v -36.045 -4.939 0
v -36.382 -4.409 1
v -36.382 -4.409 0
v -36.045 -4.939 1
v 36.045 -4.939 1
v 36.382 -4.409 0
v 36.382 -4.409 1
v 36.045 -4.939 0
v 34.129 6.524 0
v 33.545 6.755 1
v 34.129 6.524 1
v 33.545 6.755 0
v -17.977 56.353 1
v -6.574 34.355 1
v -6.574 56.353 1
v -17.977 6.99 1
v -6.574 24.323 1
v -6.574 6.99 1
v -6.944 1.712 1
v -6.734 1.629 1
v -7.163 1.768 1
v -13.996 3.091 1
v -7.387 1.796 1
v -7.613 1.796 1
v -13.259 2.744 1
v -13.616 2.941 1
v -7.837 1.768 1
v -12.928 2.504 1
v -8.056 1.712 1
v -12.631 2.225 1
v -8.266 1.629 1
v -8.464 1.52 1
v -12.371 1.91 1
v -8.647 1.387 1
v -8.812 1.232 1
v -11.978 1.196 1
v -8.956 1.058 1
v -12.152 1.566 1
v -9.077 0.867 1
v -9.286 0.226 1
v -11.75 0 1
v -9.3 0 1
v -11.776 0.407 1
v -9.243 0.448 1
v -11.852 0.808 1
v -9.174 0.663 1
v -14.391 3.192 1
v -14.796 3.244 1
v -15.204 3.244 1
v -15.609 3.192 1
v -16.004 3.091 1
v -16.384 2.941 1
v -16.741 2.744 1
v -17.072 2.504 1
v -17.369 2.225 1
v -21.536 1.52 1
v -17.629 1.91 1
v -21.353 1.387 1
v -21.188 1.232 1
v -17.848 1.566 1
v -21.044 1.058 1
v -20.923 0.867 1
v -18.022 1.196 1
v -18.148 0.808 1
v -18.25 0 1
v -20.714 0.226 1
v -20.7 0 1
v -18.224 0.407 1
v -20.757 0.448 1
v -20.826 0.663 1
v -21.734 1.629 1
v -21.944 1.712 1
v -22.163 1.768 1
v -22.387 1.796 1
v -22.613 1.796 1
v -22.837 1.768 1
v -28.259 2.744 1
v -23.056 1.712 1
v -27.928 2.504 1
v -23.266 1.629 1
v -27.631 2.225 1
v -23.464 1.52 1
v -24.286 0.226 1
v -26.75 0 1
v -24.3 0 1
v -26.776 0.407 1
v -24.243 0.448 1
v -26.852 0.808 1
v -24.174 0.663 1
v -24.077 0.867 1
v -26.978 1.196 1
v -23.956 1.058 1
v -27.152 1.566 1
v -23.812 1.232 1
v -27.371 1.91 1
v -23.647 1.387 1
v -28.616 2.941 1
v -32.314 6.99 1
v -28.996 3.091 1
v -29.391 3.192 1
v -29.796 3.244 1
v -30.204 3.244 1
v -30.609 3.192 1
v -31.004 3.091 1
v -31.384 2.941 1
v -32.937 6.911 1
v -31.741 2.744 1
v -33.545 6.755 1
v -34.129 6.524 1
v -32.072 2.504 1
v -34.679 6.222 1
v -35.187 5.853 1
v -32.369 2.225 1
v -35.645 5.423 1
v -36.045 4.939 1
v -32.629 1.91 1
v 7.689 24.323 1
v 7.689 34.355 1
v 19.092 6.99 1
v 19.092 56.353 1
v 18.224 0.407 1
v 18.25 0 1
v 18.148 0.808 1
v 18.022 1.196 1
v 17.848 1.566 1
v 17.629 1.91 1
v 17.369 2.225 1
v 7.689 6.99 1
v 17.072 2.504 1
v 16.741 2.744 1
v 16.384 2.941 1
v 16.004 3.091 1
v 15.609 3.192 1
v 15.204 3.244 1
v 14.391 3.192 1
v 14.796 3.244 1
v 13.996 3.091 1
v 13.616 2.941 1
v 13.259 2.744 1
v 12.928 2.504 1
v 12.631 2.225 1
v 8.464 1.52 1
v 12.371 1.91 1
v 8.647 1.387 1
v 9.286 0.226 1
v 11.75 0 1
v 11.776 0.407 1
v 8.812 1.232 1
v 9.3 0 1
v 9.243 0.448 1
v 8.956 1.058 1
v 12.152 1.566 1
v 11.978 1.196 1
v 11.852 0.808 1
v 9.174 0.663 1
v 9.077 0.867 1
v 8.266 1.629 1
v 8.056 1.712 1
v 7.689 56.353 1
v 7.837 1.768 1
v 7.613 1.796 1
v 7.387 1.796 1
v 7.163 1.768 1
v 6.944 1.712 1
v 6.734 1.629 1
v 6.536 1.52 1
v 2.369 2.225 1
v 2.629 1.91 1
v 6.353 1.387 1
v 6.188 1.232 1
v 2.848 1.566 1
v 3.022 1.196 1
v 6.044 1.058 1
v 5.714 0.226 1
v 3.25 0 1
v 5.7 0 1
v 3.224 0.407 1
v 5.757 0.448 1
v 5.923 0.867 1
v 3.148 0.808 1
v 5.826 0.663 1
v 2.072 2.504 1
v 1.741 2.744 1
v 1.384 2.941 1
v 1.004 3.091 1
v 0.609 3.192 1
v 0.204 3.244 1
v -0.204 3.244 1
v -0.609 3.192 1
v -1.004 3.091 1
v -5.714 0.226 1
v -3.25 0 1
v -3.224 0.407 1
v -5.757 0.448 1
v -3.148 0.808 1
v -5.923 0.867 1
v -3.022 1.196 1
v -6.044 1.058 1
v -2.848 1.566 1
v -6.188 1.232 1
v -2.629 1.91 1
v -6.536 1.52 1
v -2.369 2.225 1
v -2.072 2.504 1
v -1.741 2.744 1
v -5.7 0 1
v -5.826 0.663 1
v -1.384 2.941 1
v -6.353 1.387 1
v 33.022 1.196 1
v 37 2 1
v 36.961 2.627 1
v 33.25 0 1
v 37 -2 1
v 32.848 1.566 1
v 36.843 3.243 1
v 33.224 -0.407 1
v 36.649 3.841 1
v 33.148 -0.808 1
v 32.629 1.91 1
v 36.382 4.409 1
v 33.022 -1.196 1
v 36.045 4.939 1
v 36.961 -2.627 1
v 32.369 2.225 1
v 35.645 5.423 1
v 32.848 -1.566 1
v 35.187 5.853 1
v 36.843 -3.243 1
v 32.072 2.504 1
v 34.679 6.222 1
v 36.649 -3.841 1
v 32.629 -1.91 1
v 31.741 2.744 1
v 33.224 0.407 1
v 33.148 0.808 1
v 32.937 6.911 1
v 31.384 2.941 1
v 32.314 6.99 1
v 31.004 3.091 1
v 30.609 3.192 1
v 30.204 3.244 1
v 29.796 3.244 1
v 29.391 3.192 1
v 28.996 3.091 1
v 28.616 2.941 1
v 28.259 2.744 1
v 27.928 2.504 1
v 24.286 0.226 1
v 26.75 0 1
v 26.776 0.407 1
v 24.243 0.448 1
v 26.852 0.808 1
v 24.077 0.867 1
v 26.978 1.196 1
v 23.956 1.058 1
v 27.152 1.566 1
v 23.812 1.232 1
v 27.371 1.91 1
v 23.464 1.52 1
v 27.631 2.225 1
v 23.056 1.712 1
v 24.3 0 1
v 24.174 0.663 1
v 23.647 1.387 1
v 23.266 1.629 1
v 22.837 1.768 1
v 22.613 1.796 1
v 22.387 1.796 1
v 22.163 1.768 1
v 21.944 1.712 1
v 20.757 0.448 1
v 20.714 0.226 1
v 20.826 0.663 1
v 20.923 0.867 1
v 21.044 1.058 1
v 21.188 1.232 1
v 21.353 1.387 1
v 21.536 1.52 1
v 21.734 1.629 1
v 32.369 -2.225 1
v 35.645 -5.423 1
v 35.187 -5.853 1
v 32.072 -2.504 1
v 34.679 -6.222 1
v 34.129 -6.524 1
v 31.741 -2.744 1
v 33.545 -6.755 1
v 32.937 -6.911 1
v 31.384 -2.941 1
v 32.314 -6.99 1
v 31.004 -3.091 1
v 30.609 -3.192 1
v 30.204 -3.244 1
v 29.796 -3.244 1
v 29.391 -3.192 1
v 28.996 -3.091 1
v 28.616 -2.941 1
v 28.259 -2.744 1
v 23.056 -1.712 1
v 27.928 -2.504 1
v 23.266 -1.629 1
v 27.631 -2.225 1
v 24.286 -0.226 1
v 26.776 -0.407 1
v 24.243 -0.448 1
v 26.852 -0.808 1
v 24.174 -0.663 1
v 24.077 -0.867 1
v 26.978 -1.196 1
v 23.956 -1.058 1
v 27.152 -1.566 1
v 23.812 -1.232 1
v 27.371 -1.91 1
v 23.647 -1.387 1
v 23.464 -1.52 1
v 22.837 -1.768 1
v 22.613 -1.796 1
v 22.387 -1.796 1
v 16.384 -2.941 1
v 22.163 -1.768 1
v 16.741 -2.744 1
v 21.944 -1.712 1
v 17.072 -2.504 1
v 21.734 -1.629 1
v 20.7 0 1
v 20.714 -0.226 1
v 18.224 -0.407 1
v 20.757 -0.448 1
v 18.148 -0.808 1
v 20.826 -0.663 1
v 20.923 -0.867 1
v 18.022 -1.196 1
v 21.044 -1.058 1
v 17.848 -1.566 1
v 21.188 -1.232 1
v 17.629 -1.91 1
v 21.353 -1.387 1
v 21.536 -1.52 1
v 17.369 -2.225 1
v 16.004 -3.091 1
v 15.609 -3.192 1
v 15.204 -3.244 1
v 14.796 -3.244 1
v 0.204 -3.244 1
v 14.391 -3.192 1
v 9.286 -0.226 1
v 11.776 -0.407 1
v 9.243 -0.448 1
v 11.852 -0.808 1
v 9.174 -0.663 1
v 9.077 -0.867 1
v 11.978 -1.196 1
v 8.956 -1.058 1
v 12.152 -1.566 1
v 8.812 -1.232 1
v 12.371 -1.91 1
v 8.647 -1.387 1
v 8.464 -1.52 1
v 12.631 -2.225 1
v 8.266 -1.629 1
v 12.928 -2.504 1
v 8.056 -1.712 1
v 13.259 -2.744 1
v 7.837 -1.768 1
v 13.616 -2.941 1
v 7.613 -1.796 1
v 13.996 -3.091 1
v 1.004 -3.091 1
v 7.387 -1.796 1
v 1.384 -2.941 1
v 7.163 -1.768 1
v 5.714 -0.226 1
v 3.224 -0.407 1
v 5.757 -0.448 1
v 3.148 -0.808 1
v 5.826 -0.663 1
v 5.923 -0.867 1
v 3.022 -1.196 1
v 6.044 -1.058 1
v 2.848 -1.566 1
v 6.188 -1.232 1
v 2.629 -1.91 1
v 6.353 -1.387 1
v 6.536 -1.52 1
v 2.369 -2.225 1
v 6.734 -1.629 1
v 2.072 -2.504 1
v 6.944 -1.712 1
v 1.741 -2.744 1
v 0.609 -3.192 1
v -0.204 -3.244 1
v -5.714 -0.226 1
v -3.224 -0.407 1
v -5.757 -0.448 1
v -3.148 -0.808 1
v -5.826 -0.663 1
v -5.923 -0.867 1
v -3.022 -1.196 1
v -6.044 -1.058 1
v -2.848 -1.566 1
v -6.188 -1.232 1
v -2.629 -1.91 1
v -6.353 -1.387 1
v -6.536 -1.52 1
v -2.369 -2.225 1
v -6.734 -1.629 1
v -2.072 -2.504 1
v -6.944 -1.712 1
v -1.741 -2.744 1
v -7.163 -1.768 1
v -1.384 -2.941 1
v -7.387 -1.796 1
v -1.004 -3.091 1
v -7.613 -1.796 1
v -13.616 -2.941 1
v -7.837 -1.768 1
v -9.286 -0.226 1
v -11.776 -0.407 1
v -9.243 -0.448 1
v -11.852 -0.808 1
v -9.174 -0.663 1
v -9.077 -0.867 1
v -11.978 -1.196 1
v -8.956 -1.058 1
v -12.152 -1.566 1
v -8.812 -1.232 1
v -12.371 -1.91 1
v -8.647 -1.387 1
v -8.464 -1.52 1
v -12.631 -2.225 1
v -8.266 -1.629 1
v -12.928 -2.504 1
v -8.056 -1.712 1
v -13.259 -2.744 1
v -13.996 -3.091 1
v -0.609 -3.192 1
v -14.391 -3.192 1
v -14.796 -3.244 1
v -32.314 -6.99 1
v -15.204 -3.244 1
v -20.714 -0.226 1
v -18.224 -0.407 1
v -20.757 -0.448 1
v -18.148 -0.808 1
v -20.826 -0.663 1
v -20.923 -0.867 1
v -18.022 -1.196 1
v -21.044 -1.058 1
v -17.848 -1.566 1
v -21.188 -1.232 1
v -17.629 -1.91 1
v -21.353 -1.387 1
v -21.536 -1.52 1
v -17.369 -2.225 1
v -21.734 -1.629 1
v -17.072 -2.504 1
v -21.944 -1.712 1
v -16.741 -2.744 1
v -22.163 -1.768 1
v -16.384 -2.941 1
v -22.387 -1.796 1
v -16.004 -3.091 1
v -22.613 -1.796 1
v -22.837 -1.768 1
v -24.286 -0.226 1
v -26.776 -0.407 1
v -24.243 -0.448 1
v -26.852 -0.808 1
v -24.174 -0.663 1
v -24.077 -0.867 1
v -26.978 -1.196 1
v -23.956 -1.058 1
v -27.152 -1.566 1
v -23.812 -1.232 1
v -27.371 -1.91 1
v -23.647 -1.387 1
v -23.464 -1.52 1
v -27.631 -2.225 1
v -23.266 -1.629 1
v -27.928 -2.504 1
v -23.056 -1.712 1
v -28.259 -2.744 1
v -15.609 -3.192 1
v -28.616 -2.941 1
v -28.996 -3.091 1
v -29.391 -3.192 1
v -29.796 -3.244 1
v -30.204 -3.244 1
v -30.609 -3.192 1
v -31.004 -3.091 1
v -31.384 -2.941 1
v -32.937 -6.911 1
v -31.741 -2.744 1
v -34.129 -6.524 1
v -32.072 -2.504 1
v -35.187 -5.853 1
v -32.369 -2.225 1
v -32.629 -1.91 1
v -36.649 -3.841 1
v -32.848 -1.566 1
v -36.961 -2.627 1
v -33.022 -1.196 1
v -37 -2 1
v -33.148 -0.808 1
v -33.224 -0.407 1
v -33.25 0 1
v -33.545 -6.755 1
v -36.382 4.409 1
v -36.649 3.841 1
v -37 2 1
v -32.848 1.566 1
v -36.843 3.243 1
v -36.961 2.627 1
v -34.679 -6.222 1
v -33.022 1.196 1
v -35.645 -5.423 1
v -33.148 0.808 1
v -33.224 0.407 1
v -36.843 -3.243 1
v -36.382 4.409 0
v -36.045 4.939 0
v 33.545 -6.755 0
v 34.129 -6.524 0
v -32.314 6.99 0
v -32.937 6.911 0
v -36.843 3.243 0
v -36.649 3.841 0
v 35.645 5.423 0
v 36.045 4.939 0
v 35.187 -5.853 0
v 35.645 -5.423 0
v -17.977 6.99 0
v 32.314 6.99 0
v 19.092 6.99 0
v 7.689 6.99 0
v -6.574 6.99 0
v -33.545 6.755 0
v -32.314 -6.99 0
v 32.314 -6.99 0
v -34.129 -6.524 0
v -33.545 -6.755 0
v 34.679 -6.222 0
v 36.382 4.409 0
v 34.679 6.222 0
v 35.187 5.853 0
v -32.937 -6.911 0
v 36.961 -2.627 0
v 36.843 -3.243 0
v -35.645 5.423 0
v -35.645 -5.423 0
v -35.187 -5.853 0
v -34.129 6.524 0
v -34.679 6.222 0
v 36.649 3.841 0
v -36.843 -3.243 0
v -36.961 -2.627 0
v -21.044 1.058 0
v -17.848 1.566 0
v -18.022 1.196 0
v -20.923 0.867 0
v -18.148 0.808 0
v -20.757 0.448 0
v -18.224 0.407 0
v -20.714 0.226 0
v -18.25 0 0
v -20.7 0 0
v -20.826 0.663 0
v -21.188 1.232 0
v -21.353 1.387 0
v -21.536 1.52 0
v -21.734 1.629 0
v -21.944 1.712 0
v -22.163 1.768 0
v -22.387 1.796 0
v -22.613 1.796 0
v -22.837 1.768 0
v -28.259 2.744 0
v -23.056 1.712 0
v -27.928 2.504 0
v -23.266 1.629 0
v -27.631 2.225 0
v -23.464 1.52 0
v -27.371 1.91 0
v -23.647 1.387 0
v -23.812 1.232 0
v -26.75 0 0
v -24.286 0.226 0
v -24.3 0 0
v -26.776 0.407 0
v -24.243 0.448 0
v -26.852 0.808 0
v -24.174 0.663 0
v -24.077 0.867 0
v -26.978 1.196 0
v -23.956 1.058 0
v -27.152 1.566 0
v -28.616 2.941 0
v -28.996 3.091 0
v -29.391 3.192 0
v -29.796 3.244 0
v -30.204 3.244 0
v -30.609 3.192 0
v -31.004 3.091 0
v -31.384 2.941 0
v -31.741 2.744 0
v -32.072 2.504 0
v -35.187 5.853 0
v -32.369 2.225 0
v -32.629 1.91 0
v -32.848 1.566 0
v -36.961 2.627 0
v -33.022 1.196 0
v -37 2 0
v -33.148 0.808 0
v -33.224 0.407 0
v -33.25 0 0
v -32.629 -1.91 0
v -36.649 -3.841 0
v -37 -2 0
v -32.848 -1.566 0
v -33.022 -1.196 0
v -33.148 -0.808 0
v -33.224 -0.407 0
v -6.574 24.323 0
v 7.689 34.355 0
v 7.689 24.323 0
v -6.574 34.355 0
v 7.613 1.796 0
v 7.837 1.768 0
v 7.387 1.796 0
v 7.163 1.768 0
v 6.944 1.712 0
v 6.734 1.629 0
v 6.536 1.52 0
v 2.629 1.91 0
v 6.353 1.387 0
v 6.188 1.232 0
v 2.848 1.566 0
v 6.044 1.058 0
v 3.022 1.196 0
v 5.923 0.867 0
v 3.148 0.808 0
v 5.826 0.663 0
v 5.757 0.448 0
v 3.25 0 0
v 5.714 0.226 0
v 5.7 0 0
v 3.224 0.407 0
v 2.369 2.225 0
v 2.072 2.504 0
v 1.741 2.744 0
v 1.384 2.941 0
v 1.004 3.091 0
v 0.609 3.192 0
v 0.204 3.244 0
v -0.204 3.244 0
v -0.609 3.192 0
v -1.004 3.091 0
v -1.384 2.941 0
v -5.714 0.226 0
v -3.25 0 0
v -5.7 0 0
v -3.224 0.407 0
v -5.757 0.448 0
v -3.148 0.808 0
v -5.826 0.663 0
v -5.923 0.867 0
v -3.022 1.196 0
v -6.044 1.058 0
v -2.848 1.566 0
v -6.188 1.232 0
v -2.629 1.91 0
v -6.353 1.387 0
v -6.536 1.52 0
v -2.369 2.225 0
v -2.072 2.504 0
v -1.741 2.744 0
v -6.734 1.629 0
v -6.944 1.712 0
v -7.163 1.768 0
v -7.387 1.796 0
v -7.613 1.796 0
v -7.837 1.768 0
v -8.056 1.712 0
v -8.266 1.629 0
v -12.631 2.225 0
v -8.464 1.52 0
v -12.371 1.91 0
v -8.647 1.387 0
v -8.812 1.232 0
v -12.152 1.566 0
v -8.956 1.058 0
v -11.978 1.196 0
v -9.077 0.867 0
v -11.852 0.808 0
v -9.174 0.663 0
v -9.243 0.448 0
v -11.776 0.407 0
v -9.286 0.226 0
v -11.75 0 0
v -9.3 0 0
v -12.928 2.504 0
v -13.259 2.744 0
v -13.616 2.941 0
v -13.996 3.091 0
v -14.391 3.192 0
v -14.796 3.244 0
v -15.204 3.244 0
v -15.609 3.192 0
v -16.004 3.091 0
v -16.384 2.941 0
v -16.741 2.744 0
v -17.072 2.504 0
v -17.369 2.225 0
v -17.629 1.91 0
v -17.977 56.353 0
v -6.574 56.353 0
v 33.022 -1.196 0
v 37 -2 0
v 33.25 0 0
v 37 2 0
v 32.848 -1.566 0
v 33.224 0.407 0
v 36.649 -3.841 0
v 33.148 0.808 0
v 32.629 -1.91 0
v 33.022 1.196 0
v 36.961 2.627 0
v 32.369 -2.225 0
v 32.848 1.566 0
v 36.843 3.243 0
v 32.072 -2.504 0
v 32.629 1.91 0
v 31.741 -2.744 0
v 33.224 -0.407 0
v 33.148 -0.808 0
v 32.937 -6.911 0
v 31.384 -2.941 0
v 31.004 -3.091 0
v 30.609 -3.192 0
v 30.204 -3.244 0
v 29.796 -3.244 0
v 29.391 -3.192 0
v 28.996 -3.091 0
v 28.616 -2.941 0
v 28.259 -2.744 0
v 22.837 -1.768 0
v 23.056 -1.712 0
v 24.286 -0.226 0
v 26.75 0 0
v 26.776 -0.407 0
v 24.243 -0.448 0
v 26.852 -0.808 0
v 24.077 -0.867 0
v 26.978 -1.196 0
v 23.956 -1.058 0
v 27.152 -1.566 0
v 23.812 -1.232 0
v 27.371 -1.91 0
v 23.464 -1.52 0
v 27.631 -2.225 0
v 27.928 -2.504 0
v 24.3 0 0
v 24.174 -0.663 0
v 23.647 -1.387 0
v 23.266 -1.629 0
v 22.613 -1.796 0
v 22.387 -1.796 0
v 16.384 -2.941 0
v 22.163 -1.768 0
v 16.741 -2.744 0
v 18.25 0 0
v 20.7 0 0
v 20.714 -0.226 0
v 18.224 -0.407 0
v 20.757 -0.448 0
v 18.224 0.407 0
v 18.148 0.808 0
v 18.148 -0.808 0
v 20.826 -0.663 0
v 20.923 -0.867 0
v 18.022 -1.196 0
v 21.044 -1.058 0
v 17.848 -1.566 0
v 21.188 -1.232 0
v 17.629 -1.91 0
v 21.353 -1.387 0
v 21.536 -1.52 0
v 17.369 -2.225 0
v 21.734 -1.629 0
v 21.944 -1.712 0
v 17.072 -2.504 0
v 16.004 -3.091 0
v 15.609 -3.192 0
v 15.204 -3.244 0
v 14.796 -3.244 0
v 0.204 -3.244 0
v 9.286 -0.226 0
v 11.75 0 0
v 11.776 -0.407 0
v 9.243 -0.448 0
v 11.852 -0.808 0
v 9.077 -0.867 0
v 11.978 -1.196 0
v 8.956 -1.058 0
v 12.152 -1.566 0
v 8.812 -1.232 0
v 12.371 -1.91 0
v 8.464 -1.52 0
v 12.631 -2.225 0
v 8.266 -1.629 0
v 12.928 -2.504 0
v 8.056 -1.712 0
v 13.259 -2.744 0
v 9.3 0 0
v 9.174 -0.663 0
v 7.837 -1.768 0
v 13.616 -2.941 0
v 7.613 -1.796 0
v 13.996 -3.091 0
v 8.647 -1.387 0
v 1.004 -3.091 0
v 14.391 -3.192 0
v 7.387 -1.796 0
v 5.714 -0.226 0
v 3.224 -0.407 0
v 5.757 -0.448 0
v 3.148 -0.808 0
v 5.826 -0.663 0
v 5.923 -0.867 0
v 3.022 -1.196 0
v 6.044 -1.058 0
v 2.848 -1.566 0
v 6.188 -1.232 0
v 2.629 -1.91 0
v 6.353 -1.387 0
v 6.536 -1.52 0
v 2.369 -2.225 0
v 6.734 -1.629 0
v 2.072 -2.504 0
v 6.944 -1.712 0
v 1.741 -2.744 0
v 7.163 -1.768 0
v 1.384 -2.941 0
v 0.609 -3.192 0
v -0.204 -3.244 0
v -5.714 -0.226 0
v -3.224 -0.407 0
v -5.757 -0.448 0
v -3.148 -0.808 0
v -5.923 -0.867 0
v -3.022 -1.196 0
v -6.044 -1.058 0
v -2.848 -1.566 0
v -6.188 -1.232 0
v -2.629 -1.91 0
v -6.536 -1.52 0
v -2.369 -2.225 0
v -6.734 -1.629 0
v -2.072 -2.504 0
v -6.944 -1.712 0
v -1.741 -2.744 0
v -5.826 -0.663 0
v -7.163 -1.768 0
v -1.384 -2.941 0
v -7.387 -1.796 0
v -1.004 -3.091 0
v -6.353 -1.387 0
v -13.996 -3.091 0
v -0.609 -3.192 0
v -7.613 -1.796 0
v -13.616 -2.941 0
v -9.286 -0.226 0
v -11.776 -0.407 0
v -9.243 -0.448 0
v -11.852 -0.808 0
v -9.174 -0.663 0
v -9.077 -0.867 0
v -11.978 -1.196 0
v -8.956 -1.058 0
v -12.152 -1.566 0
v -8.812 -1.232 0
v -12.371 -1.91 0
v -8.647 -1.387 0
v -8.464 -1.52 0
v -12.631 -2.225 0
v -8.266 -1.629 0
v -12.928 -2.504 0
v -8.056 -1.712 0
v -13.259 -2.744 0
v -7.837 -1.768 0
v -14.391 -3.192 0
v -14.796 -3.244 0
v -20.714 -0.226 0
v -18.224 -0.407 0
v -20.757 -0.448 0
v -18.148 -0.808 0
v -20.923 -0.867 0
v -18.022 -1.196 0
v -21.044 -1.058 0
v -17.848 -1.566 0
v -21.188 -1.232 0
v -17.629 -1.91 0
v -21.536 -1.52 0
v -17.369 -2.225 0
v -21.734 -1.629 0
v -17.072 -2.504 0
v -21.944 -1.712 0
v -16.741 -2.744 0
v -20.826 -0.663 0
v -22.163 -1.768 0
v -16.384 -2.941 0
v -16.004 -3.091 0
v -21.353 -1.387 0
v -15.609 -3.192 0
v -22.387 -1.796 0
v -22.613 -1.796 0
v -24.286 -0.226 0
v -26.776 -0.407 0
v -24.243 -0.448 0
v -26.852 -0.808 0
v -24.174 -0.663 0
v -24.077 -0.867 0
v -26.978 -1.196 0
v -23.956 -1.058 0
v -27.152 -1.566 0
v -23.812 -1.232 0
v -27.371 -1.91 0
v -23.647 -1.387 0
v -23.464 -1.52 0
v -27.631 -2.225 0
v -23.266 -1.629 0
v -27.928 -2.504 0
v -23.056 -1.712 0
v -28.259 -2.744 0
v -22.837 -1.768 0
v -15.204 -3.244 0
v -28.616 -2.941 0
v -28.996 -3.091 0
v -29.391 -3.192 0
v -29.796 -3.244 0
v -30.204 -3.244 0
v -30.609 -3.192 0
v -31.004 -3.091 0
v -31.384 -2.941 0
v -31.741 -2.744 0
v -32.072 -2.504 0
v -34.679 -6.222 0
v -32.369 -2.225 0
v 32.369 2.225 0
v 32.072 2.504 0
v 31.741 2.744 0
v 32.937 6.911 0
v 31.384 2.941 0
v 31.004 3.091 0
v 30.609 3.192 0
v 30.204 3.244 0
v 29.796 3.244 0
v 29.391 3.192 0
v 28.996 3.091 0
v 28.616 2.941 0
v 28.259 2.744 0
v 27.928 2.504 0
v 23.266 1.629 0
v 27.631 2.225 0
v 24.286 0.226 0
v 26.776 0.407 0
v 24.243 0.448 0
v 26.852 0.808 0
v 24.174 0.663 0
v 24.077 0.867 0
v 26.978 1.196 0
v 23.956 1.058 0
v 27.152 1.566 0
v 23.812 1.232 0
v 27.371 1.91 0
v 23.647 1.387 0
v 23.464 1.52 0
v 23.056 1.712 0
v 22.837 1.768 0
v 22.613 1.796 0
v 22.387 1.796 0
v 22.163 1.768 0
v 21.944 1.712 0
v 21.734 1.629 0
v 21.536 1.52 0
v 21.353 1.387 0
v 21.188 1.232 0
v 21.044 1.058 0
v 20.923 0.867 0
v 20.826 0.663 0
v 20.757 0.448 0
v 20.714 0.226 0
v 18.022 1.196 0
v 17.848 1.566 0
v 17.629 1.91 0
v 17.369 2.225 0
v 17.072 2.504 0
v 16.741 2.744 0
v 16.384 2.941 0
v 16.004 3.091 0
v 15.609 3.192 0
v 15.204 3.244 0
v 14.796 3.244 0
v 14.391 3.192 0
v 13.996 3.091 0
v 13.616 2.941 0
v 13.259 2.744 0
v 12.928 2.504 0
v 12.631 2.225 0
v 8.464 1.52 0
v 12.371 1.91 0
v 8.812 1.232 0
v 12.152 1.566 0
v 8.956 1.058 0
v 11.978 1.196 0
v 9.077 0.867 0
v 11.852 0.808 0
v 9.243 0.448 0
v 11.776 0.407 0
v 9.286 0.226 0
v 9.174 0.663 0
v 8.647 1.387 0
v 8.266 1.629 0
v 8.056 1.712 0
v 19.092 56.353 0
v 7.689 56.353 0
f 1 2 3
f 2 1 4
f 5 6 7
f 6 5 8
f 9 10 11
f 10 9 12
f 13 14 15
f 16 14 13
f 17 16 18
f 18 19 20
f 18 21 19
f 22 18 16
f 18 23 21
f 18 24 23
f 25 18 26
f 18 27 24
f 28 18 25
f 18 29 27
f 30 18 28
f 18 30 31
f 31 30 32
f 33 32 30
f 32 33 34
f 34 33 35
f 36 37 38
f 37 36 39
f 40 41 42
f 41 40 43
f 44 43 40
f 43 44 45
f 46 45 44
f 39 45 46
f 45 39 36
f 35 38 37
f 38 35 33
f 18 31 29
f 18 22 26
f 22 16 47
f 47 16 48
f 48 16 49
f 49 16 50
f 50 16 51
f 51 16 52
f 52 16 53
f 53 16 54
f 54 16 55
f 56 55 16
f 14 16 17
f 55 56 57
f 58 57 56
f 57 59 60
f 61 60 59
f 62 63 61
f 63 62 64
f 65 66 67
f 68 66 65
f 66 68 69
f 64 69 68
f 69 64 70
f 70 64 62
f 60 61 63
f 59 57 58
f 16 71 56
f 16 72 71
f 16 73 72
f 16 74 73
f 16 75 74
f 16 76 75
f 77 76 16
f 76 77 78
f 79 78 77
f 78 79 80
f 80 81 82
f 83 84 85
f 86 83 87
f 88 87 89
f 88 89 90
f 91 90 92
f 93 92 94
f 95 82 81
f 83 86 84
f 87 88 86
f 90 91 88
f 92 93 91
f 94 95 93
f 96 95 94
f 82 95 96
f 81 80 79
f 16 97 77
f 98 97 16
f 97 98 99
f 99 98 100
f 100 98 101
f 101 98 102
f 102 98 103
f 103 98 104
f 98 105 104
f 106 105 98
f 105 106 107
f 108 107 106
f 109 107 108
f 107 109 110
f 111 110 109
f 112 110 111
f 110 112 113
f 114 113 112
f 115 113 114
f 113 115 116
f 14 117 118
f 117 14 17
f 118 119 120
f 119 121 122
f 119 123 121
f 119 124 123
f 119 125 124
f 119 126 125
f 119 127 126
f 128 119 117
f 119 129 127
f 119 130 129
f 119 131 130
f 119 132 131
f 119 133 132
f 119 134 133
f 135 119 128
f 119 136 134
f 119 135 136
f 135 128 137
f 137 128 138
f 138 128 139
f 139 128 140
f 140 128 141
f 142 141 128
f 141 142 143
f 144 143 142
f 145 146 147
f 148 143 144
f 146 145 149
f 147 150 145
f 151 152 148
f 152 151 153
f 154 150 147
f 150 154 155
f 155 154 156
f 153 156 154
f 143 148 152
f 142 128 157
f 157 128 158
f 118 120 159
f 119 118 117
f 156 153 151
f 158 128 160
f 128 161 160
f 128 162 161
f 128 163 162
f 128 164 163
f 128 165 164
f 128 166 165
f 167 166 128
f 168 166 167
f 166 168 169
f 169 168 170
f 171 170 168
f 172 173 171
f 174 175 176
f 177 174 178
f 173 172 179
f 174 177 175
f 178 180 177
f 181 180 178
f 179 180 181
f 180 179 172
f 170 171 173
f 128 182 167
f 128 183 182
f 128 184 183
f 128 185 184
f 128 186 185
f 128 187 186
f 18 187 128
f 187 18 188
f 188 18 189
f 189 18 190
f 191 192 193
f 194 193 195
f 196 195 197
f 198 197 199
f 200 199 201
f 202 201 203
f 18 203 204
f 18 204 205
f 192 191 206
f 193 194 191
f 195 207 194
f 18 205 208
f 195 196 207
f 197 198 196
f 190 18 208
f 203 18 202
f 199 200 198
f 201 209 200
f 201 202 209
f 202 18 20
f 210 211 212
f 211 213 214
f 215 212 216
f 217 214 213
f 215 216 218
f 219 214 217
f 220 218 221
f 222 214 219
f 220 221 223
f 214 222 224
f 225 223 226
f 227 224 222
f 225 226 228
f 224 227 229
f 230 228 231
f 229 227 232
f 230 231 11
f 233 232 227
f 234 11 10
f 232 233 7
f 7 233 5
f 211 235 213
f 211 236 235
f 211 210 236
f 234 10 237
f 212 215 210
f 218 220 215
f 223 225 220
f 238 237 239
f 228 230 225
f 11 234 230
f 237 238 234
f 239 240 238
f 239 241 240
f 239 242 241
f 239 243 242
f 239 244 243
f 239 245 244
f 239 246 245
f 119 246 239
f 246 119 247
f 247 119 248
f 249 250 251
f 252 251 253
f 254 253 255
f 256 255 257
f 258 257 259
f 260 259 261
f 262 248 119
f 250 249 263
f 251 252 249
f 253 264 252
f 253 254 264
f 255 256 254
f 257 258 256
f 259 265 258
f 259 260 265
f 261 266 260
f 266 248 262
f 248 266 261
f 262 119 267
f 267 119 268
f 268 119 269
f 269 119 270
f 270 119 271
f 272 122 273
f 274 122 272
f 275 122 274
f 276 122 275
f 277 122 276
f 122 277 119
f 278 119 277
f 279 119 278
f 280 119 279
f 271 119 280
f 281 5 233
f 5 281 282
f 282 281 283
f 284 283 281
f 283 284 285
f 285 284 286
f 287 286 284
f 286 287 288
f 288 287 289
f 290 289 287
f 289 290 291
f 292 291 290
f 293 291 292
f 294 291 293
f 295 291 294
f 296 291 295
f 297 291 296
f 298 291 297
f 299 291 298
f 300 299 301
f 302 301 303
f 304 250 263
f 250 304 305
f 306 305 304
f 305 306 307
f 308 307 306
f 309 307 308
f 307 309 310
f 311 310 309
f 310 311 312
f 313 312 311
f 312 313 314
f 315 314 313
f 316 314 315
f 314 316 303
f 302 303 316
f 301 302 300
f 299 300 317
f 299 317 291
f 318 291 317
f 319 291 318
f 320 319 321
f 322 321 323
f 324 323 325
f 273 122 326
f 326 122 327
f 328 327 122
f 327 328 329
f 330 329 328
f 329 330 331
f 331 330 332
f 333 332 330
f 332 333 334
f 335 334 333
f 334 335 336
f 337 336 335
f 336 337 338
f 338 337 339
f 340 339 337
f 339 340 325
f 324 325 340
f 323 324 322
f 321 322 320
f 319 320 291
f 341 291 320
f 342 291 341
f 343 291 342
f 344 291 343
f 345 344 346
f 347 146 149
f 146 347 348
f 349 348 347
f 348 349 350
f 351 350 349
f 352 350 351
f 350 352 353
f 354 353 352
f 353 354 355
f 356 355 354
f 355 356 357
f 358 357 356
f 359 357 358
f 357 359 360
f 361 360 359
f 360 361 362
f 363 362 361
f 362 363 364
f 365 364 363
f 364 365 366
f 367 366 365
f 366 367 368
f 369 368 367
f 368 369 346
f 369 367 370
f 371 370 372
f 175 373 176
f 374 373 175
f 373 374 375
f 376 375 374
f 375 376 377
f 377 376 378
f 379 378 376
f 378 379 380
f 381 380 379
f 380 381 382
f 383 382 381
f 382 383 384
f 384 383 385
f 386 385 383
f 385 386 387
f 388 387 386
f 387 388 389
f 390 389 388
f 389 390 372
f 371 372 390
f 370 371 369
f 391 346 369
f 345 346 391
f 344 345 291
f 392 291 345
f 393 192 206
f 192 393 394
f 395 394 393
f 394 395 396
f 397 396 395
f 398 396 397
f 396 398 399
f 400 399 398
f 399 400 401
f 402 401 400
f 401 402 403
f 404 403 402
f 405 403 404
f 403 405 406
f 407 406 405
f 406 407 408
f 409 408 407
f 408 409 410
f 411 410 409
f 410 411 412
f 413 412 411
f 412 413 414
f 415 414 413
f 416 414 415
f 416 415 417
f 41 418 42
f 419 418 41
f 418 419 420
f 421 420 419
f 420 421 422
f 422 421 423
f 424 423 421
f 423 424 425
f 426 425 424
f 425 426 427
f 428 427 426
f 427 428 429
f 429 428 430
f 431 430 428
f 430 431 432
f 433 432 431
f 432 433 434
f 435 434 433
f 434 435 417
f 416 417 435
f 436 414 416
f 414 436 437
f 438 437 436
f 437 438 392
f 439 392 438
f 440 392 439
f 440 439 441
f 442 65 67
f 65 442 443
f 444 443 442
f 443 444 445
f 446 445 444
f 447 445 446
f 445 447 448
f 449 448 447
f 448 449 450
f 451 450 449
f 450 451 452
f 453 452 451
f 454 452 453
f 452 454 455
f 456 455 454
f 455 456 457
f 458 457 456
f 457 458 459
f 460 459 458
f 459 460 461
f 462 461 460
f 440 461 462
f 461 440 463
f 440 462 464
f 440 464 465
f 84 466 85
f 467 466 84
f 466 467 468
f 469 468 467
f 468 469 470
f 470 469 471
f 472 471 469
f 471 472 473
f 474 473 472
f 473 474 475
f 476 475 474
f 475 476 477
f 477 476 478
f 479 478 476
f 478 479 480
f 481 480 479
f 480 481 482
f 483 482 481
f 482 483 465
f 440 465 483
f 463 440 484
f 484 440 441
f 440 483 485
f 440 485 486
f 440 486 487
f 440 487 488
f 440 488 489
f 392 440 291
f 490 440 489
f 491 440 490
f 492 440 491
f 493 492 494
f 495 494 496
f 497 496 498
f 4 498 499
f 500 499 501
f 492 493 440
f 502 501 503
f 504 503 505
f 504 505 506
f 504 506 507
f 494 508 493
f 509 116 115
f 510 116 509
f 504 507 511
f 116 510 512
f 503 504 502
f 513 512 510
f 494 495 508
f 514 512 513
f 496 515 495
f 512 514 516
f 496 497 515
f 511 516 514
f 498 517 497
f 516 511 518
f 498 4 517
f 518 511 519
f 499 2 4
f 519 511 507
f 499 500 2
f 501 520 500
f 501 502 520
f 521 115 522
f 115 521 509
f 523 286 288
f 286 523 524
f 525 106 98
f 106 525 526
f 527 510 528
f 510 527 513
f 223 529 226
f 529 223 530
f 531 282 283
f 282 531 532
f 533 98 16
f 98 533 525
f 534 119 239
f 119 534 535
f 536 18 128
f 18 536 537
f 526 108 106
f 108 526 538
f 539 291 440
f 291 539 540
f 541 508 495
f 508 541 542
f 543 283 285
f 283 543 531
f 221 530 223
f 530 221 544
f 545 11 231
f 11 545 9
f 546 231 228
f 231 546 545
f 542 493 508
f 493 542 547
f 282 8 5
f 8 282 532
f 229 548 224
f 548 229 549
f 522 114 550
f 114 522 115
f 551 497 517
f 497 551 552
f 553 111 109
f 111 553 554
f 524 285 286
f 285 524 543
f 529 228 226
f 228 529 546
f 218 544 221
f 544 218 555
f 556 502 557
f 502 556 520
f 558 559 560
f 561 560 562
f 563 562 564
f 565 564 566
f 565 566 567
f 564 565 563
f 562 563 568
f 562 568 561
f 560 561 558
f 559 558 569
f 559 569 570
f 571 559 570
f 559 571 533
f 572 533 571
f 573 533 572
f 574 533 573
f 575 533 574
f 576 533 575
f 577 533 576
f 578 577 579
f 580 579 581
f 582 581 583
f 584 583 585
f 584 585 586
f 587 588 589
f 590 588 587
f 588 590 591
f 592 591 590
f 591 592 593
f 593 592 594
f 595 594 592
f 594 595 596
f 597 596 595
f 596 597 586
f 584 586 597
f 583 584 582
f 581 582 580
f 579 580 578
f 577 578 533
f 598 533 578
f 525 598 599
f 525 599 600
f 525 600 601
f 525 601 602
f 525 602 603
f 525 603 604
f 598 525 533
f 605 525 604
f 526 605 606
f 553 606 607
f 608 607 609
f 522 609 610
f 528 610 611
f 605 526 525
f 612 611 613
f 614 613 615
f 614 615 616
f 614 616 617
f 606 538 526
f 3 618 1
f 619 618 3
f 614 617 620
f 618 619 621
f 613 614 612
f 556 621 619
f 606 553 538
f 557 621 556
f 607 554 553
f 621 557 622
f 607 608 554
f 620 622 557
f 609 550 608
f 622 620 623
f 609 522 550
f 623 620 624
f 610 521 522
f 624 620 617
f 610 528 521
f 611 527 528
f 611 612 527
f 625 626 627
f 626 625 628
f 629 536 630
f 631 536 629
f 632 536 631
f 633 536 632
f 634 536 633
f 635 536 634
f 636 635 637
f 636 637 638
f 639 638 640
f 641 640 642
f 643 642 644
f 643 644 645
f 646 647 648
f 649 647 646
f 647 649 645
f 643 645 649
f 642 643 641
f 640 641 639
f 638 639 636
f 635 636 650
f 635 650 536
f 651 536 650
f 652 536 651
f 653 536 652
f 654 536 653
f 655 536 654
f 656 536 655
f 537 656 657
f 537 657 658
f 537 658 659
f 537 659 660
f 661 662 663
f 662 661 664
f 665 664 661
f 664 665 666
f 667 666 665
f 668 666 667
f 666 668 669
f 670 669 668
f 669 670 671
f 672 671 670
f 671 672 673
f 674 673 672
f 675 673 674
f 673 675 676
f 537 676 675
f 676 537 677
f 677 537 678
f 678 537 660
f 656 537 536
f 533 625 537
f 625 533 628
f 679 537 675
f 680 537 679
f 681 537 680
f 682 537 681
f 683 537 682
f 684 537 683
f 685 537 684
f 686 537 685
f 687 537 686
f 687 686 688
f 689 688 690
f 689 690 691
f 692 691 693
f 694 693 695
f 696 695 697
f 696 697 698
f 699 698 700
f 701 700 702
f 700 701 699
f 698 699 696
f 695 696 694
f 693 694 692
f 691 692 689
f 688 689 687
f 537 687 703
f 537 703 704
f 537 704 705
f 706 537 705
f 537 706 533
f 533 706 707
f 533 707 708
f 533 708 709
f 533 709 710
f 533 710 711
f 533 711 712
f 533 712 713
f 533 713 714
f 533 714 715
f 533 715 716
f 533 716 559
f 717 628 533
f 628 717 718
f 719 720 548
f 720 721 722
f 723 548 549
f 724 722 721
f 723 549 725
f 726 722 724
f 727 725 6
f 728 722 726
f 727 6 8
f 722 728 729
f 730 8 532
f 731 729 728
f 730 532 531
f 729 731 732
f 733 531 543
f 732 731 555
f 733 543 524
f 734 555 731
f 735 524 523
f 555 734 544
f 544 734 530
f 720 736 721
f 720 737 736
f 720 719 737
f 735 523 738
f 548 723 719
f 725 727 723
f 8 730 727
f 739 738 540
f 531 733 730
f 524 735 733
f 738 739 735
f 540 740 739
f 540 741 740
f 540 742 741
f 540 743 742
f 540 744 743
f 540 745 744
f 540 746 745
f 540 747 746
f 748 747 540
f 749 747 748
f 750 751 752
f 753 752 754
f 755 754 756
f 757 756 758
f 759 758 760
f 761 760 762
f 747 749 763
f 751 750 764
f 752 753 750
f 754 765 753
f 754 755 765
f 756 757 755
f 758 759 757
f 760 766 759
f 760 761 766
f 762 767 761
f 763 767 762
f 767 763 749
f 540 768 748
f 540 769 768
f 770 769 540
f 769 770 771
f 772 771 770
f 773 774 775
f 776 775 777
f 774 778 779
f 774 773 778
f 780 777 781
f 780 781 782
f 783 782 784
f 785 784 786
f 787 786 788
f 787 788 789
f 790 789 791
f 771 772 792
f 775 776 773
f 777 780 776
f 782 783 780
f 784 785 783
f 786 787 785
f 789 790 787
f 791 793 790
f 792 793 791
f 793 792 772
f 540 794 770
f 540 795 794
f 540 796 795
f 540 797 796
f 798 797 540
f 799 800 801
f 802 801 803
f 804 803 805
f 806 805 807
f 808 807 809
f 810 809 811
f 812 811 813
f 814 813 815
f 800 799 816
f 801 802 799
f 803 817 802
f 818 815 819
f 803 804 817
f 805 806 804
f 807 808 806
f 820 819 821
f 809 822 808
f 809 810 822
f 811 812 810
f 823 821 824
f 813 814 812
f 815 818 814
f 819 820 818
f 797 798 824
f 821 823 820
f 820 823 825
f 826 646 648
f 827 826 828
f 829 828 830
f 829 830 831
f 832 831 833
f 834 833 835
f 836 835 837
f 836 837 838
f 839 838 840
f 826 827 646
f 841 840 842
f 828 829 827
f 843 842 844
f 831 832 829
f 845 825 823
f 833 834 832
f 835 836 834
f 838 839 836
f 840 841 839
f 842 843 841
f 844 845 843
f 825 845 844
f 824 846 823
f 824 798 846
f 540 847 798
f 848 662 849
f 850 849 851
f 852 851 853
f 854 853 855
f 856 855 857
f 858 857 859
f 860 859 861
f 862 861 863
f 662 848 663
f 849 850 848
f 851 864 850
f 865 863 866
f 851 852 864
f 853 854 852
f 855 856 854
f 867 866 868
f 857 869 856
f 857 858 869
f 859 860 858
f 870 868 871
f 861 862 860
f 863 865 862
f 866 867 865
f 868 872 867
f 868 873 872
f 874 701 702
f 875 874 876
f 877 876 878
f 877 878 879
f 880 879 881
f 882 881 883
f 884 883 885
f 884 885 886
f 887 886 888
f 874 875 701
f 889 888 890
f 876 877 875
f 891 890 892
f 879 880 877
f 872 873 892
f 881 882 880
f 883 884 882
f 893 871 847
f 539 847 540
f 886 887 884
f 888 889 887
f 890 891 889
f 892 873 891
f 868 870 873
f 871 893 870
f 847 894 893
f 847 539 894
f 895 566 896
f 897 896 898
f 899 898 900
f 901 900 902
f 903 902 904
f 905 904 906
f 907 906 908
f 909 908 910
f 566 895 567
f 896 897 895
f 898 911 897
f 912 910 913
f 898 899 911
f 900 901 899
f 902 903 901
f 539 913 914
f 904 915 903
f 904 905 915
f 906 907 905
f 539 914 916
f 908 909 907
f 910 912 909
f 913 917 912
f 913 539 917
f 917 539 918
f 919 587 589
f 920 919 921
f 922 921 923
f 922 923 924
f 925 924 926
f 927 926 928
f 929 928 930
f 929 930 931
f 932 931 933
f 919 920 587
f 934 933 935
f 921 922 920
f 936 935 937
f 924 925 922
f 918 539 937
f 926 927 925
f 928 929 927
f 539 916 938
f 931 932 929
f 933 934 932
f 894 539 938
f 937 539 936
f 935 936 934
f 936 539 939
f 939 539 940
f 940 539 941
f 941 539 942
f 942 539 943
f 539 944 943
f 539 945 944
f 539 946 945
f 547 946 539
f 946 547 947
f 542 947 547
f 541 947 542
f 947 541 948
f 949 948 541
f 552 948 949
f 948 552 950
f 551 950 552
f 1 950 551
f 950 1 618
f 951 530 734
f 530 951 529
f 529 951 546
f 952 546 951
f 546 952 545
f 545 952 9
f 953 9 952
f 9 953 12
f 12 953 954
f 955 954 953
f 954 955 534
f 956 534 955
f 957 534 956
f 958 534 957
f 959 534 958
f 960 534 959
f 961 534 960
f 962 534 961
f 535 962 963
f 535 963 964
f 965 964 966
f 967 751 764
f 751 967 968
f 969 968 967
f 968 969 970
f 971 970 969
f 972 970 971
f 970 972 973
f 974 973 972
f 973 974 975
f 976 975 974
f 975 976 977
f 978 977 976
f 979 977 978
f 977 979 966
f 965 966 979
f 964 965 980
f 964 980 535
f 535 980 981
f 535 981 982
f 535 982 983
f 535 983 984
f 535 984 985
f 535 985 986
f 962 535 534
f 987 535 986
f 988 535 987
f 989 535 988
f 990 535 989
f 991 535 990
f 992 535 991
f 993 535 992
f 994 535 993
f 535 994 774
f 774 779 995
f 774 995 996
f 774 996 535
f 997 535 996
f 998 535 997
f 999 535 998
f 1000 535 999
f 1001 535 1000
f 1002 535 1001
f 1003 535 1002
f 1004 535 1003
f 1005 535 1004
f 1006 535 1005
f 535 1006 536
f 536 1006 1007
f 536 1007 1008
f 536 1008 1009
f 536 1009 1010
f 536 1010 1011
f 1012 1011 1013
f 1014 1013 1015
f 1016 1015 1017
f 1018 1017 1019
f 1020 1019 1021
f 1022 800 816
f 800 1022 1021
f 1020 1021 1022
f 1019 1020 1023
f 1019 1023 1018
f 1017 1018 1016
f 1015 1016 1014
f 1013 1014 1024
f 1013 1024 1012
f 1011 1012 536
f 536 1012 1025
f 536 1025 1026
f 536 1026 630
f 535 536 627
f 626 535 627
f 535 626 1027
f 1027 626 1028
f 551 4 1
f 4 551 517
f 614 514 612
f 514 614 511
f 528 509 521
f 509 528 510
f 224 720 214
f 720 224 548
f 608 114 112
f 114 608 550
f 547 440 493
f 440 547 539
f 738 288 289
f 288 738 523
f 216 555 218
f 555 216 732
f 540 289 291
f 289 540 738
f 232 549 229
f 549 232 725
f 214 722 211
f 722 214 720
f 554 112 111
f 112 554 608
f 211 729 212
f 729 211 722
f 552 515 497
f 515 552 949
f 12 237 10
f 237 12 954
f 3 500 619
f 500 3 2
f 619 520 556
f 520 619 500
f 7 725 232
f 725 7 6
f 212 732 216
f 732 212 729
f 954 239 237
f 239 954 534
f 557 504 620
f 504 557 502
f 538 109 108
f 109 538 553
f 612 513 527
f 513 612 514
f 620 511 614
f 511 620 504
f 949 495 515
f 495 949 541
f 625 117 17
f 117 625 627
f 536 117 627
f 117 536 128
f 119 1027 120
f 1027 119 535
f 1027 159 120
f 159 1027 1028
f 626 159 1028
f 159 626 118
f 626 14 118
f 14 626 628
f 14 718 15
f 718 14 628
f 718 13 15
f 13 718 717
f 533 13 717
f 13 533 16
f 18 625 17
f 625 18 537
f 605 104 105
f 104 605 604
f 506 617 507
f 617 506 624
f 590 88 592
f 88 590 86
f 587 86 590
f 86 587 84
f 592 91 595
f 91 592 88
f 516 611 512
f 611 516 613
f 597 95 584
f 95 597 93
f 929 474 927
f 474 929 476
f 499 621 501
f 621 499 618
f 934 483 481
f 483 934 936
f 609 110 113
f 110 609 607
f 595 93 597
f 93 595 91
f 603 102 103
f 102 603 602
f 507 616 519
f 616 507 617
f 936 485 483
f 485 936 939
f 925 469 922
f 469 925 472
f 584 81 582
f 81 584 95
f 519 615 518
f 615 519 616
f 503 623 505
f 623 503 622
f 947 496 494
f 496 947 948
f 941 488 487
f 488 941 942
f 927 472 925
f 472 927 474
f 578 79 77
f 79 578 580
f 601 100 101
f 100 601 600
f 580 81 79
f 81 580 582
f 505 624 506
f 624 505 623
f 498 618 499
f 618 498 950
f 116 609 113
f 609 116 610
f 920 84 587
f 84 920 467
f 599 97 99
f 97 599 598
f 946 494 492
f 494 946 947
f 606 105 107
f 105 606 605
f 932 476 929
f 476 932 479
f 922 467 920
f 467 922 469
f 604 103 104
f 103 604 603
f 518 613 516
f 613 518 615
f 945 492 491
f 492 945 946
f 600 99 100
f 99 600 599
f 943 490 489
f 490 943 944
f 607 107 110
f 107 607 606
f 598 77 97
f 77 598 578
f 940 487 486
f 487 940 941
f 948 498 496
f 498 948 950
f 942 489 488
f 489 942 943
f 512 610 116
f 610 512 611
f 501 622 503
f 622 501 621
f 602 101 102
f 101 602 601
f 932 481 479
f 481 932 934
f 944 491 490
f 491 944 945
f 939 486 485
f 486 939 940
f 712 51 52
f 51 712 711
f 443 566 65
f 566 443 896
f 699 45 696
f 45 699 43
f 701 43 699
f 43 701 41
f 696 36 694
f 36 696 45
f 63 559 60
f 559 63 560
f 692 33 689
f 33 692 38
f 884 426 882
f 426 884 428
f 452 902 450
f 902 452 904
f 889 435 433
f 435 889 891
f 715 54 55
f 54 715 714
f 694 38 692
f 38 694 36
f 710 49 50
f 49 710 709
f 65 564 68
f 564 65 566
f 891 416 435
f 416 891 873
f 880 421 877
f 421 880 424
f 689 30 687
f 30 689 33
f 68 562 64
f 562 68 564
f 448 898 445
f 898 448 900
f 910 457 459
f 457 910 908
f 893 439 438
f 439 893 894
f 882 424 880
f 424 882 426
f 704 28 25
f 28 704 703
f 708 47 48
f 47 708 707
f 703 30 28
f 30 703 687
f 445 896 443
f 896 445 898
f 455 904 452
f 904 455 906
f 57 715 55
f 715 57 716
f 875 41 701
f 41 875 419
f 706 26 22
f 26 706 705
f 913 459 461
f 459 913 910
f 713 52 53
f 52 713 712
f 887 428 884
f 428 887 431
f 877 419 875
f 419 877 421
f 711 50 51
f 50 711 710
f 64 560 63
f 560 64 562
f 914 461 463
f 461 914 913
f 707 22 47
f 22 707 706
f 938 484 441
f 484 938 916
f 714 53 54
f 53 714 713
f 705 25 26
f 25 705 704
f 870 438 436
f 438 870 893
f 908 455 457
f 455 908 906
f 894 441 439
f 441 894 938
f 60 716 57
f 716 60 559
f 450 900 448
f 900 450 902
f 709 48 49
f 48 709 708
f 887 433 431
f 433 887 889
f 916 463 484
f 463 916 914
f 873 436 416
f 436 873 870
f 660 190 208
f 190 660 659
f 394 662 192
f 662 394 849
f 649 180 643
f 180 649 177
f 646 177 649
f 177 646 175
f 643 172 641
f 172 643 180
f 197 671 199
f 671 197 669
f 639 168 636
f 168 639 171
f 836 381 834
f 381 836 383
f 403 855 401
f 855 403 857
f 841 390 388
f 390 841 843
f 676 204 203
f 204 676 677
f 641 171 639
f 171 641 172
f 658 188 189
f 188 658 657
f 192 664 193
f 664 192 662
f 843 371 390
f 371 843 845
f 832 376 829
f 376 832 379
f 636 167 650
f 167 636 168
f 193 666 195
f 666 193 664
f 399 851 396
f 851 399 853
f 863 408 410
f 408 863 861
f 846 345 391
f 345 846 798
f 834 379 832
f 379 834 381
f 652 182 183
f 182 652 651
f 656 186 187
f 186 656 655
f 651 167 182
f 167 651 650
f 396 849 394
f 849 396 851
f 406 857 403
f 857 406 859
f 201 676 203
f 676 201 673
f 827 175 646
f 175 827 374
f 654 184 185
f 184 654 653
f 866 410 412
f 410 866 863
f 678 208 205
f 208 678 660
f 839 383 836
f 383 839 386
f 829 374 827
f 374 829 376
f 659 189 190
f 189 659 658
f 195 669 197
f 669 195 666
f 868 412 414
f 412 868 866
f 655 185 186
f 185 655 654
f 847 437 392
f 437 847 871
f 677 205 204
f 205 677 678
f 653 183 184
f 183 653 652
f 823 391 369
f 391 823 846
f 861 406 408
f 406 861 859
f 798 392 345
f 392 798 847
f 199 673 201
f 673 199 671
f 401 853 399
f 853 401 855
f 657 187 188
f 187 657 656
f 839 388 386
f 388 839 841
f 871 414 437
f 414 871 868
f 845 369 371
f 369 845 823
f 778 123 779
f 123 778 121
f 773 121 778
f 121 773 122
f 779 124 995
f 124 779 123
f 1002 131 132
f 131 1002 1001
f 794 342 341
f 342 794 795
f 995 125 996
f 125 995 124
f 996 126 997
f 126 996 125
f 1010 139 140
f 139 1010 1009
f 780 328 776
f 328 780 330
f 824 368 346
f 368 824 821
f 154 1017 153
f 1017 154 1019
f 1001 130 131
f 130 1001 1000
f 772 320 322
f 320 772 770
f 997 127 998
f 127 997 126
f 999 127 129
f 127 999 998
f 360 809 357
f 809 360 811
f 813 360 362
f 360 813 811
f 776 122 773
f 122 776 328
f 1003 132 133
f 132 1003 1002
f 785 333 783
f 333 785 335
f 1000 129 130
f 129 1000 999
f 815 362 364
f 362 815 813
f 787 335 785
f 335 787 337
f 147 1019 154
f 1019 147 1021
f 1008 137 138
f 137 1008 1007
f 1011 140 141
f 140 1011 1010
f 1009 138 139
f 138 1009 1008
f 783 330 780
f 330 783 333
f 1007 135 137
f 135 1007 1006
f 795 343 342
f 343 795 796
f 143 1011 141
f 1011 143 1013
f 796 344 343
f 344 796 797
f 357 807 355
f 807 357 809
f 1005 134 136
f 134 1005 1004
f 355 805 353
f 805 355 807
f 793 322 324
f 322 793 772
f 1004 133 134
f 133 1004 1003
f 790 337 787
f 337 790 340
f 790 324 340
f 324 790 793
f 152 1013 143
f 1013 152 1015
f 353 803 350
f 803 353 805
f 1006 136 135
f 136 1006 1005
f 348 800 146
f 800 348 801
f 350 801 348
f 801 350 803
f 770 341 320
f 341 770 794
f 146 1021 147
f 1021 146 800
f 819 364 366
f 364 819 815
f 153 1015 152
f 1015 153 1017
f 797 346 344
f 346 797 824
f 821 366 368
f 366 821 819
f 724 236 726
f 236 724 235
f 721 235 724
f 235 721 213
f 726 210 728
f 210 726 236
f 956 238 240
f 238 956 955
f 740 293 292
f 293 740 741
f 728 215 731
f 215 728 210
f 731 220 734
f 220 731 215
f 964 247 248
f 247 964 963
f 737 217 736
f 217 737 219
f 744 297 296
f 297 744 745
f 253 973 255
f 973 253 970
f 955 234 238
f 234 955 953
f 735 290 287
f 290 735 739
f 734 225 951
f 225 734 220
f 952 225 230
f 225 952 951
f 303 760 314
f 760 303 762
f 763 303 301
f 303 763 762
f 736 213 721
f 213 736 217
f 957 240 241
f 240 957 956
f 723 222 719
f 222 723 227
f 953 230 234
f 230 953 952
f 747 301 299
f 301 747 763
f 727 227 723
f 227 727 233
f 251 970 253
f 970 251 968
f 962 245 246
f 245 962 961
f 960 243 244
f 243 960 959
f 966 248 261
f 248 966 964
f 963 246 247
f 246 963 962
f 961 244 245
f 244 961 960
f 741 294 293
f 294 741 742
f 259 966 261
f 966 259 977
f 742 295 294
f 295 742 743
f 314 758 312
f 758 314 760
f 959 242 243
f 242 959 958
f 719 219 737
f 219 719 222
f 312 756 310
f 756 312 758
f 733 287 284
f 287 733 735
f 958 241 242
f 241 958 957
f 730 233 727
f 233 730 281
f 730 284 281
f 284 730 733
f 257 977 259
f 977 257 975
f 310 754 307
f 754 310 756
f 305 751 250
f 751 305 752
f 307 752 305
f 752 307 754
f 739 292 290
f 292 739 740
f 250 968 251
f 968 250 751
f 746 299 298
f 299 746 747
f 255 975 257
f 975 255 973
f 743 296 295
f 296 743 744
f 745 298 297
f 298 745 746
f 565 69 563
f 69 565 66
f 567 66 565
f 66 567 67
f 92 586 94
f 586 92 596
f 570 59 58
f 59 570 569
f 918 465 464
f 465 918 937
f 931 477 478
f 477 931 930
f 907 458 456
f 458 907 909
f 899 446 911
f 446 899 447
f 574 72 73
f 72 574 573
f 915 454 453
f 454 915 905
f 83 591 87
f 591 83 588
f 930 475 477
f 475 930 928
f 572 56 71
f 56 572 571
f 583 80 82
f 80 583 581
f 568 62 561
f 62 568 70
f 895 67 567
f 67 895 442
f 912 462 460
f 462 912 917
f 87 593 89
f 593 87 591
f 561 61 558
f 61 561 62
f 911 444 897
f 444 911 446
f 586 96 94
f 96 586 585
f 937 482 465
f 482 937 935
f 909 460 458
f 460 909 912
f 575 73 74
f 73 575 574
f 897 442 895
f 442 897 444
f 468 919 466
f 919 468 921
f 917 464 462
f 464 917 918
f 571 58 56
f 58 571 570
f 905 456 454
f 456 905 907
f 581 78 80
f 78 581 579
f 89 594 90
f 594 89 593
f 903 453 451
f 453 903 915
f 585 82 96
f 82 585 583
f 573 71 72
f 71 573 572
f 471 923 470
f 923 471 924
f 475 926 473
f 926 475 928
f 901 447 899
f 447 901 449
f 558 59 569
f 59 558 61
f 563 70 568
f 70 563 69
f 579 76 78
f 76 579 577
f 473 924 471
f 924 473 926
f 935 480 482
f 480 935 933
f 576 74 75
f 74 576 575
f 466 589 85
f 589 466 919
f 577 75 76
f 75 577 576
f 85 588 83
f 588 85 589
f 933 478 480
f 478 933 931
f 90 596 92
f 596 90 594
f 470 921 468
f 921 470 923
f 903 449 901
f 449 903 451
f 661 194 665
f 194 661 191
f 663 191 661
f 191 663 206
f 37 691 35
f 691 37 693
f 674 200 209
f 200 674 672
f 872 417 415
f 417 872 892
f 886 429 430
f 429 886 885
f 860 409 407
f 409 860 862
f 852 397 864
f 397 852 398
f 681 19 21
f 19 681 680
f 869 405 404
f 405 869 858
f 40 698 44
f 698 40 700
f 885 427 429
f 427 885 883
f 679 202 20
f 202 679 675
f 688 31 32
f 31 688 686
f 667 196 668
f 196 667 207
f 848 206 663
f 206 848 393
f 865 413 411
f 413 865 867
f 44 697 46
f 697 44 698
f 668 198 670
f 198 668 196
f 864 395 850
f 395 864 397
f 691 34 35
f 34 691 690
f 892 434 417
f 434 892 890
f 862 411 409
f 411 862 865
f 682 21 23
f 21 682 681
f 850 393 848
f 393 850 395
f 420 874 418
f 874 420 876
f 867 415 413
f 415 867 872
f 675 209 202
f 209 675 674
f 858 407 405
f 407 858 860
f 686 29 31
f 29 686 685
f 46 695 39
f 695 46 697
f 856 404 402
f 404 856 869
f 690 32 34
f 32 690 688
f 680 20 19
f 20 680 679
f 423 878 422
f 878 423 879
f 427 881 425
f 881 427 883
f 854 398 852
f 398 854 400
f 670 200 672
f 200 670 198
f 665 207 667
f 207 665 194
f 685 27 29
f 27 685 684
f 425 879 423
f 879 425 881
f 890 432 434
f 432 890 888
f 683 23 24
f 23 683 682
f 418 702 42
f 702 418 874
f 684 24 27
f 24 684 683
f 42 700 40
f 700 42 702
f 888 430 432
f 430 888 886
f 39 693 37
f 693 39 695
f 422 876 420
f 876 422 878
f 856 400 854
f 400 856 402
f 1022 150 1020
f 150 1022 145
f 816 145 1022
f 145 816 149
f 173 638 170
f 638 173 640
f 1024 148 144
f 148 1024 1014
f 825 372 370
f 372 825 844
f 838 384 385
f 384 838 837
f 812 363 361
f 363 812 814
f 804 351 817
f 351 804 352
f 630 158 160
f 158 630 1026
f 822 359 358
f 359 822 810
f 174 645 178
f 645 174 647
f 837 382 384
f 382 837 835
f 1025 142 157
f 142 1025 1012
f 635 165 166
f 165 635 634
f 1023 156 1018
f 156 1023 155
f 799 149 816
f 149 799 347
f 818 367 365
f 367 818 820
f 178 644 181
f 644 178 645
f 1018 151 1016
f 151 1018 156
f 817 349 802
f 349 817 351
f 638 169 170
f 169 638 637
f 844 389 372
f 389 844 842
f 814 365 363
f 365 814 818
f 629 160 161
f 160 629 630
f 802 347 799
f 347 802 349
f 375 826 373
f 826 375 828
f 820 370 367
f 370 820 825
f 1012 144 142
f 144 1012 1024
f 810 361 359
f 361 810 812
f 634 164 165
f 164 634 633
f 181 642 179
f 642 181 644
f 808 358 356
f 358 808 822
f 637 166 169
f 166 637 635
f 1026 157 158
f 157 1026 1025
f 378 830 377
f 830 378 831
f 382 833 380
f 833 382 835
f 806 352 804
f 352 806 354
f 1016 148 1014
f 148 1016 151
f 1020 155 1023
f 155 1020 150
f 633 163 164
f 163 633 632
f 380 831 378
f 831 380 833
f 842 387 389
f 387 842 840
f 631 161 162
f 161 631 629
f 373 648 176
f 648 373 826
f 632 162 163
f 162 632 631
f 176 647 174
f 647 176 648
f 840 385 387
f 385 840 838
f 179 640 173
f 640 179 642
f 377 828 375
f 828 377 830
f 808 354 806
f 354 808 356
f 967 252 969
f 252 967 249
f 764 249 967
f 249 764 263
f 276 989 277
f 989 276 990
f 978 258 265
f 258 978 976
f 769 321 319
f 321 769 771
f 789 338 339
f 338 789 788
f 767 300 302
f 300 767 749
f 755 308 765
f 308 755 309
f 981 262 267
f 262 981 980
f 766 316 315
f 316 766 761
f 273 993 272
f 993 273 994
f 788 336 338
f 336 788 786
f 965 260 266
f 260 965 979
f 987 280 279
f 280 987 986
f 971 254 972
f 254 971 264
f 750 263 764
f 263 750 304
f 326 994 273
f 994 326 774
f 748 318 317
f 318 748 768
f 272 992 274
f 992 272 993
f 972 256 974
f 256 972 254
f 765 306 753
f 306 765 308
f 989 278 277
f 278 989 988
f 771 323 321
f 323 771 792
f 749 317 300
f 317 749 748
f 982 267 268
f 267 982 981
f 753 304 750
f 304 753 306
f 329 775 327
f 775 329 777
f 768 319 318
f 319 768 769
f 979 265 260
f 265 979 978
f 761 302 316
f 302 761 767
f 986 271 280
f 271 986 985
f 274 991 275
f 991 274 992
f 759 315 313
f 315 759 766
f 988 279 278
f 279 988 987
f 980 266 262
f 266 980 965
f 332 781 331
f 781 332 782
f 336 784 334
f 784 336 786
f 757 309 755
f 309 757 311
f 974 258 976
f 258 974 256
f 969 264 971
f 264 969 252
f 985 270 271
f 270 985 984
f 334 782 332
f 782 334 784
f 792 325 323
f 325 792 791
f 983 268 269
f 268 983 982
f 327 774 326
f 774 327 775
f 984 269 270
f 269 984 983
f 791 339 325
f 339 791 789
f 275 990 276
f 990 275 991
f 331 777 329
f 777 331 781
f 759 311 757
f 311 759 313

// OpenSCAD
$fn = 50;


difference() {
	union() {
		hull() {
			translate(v = [-32.0000000000, 2.0000000000, 0]) {
				cylinder(h = 1, r = 5);
			}
			translate(v = [32.0000000000, 2.0000000000, 0]) {
				cylinder(h = 1, r = 5);
			}
			translate(v = [-32.0000000000, -2.0000000000, 0]) {
				cylinder(h = 1, r = 5);
			}
			translate(v = [32.0000000000, -2.0000000000, 0]) {
				cylinder(h = 1, r = 5);
			}
		}
		translate(v = [0, 55, 0]) {
			linear_extrude(height = 1) {
				text(font = "DejaVu Sans Mono:style=Bold", halign = "center", size = 57.0000000000, text = "H", valign = "top");
			}
		}
	}
	union() {
		translate(v = [-30.0000000000, 0.0000000000, 0]) {
			translate(v = [0, 0, -100]) {
				cylinder(h = 200, r = 3.2500000000);
			}
		}
		translate(v = [-15.0000000000, 0.0000000000, 0]) {
			translate(v = [0, 0, -100]) {
				cylinder(h = 200, r = 3.2500000000);
			}
		}
		translate(v = [0, 0, -100]) {
			cylinder(h = 200, r = 3.2500000000);
		}
		translate(v = [15.0000000000, 0.0000000000, 0]) {
			translate(v = [0, 0, -100]) {
				cylinder(h = 200, r = 3.2500000000);
			}
		}
		translate(v = [30.0000000000, 0.0000000000, 0]) {
			translate(v = [0, 0, -100]) {
				cylinder(h = 200, r = 3.2500000000);
			}
		}
		translate(v = [-30.0000000000, 0.0000000000, 0]) {
			translate(v = [0, 0, -100]) {
				cylinder(h = 200, r = 1.8000000000);
			}
		}
		translate(v = [-22.5000000000, 0.0000000000, 0]) {
			translate(v = [0, 0, -100]) {
				cylinder(h = 200, r = 1.8000000000);
			}
		}
		translate(v = [-15.0000000000, 0.0000000000, 0]) {
			translate(v = [0, 0, -100]) {
				cylinder(h = 200, r = 1.8000000000);
			}
		}
		translate(v = [-7.5000000000, 0.0000000000, 0]) {
			translate(v = [0, 0, -100]) {
				cylinder(h = 200, r = 1.8000000000);
			}
		}
		translate(v = [0, 0, -100]) {
			cylinder(h = 200, r = 1.8000000000);
		}
		translate(v = [7.5000000000, 0.0000000000, 0]) {
			translate(v = [0, 0, -100]) {
				cylinder(h = 200, r = 1.8000000000);
			}
		}
		translate(v = [15.0000000000, 0.0000000000, 0]) {
			translate(v = [0, 0, -100]) {
				cylinder(h = 200, r = 1.8000000000);
			}
		}
		translate(v = [22.5000000000, 0.0000000000, 0]) {
			translate(v = [0, 0, -100]) {
				cylinder(h = 200, r = 1.8000000000);
			}
		}
		translate(v = [30.0000000000, 0.0000000000, 0]) {
			translate(v = [0, 0, -100]) {
				cylinder(h = 200, r = 1.8000000000);
			}
		}
	}
}
